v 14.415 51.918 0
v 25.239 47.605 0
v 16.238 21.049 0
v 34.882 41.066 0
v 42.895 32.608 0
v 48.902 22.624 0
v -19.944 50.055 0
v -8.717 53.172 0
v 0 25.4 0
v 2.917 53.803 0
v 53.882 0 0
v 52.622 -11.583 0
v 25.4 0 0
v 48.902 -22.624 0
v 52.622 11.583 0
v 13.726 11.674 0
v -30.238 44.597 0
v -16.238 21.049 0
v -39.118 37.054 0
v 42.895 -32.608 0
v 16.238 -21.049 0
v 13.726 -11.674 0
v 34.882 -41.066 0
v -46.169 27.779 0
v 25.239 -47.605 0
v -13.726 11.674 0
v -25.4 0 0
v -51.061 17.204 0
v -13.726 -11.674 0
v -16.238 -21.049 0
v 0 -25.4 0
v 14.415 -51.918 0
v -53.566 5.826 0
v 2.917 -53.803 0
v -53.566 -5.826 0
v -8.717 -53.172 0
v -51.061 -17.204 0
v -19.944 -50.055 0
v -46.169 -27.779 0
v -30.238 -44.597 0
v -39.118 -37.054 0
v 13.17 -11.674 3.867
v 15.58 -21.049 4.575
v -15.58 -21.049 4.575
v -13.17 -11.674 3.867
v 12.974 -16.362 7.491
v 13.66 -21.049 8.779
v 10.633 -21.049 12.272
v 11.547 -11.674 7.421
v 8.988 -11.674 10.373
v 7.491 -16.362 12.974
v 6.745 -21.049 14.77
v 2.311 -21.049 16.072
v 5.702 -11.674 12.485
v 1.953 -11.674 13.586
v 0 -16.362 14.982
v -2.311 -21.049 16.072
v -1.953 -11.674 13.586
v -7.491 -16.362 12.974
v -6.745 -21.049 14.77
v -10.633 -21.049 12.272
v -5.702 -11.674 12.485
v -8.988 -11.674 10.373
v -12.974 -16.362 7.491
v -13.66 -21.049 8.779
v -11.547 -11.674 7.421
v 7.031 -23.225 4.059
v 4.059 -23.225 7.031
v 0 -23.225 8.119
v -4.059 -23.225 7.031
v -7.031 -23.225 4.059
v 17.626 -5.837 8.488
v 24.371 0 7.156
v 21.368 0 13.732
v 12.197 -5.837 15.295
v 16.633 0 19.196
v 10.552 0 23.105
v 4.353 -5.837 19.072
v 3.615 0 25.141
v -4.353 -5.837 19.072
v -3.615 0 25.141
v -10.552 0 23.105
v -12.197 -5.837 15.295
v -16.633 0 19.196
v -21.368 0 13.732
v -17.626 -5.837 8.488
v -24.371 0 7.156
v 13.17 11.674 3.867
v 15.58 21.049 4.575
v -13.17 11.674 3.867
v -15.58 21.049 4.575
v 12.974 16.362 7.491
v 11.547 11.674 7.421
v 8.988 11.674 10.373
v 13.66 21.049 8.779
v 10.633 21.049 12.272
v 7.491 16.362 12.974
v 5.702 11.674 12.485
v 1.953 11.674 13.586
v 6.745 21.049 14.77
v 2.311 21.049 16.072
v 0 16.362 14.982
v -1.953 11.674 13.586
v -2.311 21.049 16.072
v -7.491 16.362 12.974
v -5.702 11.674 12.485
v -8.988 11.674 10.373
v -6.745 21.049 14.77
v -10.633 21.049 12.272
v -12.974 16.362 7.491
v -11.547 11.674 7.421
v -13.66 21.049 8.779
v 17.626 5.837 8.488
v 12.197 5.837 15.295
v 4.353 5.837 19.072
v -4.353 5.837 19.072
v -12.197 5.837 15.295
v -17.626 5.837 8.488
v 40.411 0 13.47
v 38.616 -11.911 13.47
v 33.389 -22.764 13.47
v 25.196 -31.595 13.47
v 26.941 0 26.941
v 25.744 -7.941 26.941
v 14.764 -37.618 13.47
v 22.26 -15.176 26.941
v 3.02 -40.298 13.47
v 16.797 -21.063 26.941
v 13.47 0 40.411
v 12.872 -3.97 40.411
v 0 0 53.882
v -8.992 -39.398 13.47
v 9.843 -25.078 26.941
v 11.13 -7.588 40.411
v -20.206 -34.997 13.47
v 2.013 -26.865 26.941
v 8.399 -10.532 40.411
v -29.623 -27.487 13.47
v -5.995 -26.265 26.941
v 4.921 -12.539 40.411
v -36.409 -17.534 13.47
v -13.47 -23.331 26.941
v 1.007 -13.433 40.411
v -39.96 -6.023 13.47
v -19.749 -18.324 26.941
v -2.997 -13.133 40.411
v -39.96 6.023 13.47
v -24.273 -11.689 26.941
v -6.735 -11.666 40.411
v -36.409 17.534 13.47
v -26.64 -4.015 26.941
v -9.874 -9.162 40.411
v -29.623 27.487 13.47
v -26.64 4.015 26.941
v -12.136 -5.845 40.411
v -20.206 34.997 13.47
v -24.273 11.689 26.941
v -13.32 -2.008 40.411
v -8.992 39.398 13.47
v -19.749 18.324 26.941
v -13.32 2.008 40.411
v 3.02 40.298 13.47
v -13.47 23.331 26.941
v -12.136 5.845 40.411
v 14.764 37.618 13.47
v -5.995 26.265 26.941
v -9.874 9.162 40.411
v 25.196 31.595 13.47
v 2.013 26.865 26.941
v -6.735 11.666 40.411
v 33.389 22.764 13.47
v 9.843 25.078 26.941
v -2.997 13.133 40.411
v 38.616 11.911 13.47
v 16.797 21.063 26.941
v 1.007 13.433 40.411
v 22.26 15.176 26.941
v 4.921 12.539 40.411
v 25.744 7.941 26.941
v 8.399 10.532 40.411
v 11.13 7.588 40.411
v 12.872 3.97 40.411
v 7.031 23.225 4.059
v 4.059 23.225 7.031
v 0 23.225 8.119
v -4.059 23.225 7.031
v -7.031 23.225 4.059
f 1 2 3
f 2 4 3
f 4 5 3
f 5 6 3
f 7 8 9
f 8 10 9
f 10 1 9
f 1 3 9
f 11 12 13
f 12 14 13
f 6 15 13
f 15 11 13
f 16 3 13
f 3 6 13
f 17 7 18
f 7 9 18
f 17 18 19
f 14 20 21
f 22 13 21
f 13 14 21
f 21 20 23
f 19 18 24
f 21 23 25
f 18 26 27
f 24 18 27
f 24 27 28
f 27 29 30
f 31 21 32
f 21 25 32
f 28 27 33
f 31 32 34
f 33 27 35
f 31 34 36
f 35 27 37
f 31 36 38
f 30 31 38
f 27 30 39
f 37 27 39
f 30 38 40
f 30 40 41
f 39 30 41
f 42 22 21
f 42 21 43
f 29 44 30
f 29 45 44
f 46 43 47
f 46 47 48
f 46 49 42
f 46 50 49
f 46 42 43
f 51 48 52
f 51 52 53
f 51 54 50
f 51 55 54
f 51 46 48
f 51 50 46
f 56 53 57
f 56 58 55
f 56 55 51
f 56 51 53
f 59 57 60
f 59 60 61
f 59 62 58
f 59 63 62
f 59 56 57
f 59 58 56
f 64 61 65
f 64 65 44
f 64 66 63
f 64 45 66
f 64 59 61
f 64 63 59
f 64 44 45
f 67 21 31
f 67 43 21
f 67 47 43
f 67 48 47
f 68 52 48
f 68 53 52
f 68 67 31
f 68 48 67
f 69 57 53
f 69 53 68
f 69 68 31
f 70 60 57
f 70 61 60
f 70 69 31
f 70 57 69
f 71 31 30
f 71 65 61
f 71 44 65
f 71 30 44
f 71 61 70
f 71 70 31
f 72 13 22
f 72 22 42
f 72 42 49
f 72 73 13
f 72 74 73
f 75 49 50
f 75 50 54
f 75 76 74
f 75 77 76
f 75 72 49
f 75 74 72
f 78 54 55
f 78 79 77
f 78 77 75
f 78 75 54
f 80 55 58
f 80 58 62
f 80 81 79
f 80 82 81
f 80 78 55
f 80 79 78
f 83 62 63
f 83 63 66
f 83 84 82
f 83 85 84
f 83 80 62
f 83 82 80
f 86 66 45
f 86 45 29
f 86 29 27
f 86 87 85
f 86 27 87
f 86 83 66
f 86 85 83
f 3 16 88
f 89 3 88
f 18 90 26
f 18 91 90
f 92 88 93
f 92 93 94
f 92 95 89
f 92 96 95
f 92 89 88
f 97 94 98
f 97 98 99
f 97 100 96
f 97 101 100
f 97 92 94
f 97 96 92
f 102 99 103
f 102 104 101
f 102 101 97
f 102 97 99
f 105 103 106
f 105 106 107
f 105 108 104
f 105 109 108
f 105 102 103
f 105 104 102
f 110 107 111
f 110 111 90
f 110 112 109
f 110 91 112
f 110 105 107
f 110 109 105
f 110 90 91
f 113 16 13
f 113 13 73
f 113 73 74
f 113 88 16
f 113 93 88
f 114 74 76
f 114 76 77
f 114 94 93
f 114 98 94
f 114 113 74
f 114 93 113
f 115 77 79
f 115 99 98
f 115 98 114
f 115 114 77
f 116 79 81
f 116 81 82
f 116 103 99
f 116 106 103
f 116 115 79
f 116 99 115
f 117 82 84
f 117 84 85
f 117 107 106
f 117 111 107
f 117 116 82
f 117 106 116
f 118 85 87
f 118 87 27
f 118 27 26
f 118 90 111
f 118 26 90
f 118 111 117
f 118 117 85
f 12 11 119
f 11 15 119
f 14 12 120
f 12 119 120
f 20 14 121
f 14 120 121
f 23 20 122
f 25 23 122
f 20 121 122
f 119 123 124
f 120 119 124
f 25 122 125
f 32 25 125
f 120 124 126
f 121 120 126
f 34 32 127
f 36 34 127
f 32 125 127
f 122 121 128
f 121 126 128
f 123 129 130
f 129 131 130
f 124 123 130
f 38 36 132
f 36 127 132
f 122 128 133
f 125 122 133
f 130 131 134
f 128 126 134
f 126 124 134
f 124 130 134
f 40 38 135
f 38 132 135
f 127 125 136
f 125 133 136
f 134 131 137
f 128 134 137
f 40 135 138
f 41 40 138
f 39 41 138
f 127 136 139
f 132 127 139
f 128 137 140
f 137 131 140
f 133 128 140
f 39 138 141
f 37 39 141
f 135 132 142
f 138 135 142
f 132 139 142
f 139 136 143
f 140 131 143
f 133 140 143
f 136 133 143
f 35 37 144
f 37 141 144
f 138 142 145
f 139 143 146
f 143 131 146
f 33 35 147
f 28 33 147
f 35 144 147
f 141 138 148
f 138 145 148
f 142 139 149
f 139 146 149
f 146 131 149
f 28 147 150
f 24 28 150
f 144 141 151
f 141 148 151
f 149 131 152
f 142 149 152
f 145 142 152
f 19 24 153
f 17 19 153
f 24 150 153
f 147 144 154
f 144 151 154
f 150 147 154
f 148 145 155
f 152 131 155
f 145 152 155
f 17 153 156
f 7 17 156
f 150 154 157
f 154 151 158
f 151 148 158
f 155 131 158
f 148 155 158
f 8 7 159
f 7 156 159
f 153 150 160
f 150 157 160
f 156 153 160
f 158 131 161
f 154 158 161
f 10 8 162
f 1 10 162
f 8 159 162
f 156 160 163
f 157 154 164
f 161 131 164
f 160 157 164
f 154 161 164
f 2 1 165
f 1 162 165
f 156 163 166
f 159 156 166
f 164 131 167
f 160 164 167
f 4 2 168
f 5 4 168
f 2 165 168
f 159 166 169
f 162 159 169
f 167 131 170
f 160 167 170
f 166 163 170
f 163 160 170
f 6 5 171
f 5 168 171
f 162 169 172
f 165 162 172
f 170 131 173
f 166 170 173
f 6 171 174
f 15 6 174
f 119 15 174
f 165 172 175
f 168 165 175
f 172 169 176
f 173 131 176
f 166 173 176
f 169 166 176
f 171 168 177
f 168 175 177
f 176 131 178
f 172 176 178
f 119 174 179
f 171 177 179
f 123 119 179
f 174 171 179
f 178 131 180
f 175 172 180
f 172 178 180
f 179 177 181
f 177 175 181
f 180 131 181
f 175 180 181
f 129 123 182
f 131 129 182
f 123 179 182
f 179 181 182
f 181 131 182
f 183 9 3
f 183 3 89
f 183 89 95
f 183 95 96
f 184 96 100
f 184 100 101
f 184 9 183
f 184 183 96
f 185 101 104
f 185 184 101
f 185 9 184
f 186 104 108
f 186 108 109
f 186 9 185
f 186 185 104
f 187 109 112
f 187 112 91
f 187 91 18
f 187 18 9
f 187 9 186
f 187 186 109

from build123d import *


with BuildPart() as f1:
    # F0 (on Front) → F1 (revolve)
    with BuildSketch(Plane.XZ):
        Polygon((53.881537, 0), (0, 53.881537), (0, 0), align=None)
    revolve(axis=Axis((0, 0, 26.940768), (0, 0, -1)))


with BuildPart() as f3:
    # F2 (on Top) → F3 (revolve)
    with BuildSketch(Plane.XY):
        Polygon((0, 25.4), (0, 0), (0, -25.4), (16.237638, -21.049138), (13.725667, -11.674333), (25.4, 0), (13.725667, 11.674333), (16.237638, 21.049138), align=None)
    revolve(axis=Axis((0, -12.7, 0), (0, -1, 0)))


with BuildPart() as f1_1:
    add(f1.part)

    # F4: cut F3
    add(f3.part, mode=Mode.SUBTRACT)


solid = f1_1.part
